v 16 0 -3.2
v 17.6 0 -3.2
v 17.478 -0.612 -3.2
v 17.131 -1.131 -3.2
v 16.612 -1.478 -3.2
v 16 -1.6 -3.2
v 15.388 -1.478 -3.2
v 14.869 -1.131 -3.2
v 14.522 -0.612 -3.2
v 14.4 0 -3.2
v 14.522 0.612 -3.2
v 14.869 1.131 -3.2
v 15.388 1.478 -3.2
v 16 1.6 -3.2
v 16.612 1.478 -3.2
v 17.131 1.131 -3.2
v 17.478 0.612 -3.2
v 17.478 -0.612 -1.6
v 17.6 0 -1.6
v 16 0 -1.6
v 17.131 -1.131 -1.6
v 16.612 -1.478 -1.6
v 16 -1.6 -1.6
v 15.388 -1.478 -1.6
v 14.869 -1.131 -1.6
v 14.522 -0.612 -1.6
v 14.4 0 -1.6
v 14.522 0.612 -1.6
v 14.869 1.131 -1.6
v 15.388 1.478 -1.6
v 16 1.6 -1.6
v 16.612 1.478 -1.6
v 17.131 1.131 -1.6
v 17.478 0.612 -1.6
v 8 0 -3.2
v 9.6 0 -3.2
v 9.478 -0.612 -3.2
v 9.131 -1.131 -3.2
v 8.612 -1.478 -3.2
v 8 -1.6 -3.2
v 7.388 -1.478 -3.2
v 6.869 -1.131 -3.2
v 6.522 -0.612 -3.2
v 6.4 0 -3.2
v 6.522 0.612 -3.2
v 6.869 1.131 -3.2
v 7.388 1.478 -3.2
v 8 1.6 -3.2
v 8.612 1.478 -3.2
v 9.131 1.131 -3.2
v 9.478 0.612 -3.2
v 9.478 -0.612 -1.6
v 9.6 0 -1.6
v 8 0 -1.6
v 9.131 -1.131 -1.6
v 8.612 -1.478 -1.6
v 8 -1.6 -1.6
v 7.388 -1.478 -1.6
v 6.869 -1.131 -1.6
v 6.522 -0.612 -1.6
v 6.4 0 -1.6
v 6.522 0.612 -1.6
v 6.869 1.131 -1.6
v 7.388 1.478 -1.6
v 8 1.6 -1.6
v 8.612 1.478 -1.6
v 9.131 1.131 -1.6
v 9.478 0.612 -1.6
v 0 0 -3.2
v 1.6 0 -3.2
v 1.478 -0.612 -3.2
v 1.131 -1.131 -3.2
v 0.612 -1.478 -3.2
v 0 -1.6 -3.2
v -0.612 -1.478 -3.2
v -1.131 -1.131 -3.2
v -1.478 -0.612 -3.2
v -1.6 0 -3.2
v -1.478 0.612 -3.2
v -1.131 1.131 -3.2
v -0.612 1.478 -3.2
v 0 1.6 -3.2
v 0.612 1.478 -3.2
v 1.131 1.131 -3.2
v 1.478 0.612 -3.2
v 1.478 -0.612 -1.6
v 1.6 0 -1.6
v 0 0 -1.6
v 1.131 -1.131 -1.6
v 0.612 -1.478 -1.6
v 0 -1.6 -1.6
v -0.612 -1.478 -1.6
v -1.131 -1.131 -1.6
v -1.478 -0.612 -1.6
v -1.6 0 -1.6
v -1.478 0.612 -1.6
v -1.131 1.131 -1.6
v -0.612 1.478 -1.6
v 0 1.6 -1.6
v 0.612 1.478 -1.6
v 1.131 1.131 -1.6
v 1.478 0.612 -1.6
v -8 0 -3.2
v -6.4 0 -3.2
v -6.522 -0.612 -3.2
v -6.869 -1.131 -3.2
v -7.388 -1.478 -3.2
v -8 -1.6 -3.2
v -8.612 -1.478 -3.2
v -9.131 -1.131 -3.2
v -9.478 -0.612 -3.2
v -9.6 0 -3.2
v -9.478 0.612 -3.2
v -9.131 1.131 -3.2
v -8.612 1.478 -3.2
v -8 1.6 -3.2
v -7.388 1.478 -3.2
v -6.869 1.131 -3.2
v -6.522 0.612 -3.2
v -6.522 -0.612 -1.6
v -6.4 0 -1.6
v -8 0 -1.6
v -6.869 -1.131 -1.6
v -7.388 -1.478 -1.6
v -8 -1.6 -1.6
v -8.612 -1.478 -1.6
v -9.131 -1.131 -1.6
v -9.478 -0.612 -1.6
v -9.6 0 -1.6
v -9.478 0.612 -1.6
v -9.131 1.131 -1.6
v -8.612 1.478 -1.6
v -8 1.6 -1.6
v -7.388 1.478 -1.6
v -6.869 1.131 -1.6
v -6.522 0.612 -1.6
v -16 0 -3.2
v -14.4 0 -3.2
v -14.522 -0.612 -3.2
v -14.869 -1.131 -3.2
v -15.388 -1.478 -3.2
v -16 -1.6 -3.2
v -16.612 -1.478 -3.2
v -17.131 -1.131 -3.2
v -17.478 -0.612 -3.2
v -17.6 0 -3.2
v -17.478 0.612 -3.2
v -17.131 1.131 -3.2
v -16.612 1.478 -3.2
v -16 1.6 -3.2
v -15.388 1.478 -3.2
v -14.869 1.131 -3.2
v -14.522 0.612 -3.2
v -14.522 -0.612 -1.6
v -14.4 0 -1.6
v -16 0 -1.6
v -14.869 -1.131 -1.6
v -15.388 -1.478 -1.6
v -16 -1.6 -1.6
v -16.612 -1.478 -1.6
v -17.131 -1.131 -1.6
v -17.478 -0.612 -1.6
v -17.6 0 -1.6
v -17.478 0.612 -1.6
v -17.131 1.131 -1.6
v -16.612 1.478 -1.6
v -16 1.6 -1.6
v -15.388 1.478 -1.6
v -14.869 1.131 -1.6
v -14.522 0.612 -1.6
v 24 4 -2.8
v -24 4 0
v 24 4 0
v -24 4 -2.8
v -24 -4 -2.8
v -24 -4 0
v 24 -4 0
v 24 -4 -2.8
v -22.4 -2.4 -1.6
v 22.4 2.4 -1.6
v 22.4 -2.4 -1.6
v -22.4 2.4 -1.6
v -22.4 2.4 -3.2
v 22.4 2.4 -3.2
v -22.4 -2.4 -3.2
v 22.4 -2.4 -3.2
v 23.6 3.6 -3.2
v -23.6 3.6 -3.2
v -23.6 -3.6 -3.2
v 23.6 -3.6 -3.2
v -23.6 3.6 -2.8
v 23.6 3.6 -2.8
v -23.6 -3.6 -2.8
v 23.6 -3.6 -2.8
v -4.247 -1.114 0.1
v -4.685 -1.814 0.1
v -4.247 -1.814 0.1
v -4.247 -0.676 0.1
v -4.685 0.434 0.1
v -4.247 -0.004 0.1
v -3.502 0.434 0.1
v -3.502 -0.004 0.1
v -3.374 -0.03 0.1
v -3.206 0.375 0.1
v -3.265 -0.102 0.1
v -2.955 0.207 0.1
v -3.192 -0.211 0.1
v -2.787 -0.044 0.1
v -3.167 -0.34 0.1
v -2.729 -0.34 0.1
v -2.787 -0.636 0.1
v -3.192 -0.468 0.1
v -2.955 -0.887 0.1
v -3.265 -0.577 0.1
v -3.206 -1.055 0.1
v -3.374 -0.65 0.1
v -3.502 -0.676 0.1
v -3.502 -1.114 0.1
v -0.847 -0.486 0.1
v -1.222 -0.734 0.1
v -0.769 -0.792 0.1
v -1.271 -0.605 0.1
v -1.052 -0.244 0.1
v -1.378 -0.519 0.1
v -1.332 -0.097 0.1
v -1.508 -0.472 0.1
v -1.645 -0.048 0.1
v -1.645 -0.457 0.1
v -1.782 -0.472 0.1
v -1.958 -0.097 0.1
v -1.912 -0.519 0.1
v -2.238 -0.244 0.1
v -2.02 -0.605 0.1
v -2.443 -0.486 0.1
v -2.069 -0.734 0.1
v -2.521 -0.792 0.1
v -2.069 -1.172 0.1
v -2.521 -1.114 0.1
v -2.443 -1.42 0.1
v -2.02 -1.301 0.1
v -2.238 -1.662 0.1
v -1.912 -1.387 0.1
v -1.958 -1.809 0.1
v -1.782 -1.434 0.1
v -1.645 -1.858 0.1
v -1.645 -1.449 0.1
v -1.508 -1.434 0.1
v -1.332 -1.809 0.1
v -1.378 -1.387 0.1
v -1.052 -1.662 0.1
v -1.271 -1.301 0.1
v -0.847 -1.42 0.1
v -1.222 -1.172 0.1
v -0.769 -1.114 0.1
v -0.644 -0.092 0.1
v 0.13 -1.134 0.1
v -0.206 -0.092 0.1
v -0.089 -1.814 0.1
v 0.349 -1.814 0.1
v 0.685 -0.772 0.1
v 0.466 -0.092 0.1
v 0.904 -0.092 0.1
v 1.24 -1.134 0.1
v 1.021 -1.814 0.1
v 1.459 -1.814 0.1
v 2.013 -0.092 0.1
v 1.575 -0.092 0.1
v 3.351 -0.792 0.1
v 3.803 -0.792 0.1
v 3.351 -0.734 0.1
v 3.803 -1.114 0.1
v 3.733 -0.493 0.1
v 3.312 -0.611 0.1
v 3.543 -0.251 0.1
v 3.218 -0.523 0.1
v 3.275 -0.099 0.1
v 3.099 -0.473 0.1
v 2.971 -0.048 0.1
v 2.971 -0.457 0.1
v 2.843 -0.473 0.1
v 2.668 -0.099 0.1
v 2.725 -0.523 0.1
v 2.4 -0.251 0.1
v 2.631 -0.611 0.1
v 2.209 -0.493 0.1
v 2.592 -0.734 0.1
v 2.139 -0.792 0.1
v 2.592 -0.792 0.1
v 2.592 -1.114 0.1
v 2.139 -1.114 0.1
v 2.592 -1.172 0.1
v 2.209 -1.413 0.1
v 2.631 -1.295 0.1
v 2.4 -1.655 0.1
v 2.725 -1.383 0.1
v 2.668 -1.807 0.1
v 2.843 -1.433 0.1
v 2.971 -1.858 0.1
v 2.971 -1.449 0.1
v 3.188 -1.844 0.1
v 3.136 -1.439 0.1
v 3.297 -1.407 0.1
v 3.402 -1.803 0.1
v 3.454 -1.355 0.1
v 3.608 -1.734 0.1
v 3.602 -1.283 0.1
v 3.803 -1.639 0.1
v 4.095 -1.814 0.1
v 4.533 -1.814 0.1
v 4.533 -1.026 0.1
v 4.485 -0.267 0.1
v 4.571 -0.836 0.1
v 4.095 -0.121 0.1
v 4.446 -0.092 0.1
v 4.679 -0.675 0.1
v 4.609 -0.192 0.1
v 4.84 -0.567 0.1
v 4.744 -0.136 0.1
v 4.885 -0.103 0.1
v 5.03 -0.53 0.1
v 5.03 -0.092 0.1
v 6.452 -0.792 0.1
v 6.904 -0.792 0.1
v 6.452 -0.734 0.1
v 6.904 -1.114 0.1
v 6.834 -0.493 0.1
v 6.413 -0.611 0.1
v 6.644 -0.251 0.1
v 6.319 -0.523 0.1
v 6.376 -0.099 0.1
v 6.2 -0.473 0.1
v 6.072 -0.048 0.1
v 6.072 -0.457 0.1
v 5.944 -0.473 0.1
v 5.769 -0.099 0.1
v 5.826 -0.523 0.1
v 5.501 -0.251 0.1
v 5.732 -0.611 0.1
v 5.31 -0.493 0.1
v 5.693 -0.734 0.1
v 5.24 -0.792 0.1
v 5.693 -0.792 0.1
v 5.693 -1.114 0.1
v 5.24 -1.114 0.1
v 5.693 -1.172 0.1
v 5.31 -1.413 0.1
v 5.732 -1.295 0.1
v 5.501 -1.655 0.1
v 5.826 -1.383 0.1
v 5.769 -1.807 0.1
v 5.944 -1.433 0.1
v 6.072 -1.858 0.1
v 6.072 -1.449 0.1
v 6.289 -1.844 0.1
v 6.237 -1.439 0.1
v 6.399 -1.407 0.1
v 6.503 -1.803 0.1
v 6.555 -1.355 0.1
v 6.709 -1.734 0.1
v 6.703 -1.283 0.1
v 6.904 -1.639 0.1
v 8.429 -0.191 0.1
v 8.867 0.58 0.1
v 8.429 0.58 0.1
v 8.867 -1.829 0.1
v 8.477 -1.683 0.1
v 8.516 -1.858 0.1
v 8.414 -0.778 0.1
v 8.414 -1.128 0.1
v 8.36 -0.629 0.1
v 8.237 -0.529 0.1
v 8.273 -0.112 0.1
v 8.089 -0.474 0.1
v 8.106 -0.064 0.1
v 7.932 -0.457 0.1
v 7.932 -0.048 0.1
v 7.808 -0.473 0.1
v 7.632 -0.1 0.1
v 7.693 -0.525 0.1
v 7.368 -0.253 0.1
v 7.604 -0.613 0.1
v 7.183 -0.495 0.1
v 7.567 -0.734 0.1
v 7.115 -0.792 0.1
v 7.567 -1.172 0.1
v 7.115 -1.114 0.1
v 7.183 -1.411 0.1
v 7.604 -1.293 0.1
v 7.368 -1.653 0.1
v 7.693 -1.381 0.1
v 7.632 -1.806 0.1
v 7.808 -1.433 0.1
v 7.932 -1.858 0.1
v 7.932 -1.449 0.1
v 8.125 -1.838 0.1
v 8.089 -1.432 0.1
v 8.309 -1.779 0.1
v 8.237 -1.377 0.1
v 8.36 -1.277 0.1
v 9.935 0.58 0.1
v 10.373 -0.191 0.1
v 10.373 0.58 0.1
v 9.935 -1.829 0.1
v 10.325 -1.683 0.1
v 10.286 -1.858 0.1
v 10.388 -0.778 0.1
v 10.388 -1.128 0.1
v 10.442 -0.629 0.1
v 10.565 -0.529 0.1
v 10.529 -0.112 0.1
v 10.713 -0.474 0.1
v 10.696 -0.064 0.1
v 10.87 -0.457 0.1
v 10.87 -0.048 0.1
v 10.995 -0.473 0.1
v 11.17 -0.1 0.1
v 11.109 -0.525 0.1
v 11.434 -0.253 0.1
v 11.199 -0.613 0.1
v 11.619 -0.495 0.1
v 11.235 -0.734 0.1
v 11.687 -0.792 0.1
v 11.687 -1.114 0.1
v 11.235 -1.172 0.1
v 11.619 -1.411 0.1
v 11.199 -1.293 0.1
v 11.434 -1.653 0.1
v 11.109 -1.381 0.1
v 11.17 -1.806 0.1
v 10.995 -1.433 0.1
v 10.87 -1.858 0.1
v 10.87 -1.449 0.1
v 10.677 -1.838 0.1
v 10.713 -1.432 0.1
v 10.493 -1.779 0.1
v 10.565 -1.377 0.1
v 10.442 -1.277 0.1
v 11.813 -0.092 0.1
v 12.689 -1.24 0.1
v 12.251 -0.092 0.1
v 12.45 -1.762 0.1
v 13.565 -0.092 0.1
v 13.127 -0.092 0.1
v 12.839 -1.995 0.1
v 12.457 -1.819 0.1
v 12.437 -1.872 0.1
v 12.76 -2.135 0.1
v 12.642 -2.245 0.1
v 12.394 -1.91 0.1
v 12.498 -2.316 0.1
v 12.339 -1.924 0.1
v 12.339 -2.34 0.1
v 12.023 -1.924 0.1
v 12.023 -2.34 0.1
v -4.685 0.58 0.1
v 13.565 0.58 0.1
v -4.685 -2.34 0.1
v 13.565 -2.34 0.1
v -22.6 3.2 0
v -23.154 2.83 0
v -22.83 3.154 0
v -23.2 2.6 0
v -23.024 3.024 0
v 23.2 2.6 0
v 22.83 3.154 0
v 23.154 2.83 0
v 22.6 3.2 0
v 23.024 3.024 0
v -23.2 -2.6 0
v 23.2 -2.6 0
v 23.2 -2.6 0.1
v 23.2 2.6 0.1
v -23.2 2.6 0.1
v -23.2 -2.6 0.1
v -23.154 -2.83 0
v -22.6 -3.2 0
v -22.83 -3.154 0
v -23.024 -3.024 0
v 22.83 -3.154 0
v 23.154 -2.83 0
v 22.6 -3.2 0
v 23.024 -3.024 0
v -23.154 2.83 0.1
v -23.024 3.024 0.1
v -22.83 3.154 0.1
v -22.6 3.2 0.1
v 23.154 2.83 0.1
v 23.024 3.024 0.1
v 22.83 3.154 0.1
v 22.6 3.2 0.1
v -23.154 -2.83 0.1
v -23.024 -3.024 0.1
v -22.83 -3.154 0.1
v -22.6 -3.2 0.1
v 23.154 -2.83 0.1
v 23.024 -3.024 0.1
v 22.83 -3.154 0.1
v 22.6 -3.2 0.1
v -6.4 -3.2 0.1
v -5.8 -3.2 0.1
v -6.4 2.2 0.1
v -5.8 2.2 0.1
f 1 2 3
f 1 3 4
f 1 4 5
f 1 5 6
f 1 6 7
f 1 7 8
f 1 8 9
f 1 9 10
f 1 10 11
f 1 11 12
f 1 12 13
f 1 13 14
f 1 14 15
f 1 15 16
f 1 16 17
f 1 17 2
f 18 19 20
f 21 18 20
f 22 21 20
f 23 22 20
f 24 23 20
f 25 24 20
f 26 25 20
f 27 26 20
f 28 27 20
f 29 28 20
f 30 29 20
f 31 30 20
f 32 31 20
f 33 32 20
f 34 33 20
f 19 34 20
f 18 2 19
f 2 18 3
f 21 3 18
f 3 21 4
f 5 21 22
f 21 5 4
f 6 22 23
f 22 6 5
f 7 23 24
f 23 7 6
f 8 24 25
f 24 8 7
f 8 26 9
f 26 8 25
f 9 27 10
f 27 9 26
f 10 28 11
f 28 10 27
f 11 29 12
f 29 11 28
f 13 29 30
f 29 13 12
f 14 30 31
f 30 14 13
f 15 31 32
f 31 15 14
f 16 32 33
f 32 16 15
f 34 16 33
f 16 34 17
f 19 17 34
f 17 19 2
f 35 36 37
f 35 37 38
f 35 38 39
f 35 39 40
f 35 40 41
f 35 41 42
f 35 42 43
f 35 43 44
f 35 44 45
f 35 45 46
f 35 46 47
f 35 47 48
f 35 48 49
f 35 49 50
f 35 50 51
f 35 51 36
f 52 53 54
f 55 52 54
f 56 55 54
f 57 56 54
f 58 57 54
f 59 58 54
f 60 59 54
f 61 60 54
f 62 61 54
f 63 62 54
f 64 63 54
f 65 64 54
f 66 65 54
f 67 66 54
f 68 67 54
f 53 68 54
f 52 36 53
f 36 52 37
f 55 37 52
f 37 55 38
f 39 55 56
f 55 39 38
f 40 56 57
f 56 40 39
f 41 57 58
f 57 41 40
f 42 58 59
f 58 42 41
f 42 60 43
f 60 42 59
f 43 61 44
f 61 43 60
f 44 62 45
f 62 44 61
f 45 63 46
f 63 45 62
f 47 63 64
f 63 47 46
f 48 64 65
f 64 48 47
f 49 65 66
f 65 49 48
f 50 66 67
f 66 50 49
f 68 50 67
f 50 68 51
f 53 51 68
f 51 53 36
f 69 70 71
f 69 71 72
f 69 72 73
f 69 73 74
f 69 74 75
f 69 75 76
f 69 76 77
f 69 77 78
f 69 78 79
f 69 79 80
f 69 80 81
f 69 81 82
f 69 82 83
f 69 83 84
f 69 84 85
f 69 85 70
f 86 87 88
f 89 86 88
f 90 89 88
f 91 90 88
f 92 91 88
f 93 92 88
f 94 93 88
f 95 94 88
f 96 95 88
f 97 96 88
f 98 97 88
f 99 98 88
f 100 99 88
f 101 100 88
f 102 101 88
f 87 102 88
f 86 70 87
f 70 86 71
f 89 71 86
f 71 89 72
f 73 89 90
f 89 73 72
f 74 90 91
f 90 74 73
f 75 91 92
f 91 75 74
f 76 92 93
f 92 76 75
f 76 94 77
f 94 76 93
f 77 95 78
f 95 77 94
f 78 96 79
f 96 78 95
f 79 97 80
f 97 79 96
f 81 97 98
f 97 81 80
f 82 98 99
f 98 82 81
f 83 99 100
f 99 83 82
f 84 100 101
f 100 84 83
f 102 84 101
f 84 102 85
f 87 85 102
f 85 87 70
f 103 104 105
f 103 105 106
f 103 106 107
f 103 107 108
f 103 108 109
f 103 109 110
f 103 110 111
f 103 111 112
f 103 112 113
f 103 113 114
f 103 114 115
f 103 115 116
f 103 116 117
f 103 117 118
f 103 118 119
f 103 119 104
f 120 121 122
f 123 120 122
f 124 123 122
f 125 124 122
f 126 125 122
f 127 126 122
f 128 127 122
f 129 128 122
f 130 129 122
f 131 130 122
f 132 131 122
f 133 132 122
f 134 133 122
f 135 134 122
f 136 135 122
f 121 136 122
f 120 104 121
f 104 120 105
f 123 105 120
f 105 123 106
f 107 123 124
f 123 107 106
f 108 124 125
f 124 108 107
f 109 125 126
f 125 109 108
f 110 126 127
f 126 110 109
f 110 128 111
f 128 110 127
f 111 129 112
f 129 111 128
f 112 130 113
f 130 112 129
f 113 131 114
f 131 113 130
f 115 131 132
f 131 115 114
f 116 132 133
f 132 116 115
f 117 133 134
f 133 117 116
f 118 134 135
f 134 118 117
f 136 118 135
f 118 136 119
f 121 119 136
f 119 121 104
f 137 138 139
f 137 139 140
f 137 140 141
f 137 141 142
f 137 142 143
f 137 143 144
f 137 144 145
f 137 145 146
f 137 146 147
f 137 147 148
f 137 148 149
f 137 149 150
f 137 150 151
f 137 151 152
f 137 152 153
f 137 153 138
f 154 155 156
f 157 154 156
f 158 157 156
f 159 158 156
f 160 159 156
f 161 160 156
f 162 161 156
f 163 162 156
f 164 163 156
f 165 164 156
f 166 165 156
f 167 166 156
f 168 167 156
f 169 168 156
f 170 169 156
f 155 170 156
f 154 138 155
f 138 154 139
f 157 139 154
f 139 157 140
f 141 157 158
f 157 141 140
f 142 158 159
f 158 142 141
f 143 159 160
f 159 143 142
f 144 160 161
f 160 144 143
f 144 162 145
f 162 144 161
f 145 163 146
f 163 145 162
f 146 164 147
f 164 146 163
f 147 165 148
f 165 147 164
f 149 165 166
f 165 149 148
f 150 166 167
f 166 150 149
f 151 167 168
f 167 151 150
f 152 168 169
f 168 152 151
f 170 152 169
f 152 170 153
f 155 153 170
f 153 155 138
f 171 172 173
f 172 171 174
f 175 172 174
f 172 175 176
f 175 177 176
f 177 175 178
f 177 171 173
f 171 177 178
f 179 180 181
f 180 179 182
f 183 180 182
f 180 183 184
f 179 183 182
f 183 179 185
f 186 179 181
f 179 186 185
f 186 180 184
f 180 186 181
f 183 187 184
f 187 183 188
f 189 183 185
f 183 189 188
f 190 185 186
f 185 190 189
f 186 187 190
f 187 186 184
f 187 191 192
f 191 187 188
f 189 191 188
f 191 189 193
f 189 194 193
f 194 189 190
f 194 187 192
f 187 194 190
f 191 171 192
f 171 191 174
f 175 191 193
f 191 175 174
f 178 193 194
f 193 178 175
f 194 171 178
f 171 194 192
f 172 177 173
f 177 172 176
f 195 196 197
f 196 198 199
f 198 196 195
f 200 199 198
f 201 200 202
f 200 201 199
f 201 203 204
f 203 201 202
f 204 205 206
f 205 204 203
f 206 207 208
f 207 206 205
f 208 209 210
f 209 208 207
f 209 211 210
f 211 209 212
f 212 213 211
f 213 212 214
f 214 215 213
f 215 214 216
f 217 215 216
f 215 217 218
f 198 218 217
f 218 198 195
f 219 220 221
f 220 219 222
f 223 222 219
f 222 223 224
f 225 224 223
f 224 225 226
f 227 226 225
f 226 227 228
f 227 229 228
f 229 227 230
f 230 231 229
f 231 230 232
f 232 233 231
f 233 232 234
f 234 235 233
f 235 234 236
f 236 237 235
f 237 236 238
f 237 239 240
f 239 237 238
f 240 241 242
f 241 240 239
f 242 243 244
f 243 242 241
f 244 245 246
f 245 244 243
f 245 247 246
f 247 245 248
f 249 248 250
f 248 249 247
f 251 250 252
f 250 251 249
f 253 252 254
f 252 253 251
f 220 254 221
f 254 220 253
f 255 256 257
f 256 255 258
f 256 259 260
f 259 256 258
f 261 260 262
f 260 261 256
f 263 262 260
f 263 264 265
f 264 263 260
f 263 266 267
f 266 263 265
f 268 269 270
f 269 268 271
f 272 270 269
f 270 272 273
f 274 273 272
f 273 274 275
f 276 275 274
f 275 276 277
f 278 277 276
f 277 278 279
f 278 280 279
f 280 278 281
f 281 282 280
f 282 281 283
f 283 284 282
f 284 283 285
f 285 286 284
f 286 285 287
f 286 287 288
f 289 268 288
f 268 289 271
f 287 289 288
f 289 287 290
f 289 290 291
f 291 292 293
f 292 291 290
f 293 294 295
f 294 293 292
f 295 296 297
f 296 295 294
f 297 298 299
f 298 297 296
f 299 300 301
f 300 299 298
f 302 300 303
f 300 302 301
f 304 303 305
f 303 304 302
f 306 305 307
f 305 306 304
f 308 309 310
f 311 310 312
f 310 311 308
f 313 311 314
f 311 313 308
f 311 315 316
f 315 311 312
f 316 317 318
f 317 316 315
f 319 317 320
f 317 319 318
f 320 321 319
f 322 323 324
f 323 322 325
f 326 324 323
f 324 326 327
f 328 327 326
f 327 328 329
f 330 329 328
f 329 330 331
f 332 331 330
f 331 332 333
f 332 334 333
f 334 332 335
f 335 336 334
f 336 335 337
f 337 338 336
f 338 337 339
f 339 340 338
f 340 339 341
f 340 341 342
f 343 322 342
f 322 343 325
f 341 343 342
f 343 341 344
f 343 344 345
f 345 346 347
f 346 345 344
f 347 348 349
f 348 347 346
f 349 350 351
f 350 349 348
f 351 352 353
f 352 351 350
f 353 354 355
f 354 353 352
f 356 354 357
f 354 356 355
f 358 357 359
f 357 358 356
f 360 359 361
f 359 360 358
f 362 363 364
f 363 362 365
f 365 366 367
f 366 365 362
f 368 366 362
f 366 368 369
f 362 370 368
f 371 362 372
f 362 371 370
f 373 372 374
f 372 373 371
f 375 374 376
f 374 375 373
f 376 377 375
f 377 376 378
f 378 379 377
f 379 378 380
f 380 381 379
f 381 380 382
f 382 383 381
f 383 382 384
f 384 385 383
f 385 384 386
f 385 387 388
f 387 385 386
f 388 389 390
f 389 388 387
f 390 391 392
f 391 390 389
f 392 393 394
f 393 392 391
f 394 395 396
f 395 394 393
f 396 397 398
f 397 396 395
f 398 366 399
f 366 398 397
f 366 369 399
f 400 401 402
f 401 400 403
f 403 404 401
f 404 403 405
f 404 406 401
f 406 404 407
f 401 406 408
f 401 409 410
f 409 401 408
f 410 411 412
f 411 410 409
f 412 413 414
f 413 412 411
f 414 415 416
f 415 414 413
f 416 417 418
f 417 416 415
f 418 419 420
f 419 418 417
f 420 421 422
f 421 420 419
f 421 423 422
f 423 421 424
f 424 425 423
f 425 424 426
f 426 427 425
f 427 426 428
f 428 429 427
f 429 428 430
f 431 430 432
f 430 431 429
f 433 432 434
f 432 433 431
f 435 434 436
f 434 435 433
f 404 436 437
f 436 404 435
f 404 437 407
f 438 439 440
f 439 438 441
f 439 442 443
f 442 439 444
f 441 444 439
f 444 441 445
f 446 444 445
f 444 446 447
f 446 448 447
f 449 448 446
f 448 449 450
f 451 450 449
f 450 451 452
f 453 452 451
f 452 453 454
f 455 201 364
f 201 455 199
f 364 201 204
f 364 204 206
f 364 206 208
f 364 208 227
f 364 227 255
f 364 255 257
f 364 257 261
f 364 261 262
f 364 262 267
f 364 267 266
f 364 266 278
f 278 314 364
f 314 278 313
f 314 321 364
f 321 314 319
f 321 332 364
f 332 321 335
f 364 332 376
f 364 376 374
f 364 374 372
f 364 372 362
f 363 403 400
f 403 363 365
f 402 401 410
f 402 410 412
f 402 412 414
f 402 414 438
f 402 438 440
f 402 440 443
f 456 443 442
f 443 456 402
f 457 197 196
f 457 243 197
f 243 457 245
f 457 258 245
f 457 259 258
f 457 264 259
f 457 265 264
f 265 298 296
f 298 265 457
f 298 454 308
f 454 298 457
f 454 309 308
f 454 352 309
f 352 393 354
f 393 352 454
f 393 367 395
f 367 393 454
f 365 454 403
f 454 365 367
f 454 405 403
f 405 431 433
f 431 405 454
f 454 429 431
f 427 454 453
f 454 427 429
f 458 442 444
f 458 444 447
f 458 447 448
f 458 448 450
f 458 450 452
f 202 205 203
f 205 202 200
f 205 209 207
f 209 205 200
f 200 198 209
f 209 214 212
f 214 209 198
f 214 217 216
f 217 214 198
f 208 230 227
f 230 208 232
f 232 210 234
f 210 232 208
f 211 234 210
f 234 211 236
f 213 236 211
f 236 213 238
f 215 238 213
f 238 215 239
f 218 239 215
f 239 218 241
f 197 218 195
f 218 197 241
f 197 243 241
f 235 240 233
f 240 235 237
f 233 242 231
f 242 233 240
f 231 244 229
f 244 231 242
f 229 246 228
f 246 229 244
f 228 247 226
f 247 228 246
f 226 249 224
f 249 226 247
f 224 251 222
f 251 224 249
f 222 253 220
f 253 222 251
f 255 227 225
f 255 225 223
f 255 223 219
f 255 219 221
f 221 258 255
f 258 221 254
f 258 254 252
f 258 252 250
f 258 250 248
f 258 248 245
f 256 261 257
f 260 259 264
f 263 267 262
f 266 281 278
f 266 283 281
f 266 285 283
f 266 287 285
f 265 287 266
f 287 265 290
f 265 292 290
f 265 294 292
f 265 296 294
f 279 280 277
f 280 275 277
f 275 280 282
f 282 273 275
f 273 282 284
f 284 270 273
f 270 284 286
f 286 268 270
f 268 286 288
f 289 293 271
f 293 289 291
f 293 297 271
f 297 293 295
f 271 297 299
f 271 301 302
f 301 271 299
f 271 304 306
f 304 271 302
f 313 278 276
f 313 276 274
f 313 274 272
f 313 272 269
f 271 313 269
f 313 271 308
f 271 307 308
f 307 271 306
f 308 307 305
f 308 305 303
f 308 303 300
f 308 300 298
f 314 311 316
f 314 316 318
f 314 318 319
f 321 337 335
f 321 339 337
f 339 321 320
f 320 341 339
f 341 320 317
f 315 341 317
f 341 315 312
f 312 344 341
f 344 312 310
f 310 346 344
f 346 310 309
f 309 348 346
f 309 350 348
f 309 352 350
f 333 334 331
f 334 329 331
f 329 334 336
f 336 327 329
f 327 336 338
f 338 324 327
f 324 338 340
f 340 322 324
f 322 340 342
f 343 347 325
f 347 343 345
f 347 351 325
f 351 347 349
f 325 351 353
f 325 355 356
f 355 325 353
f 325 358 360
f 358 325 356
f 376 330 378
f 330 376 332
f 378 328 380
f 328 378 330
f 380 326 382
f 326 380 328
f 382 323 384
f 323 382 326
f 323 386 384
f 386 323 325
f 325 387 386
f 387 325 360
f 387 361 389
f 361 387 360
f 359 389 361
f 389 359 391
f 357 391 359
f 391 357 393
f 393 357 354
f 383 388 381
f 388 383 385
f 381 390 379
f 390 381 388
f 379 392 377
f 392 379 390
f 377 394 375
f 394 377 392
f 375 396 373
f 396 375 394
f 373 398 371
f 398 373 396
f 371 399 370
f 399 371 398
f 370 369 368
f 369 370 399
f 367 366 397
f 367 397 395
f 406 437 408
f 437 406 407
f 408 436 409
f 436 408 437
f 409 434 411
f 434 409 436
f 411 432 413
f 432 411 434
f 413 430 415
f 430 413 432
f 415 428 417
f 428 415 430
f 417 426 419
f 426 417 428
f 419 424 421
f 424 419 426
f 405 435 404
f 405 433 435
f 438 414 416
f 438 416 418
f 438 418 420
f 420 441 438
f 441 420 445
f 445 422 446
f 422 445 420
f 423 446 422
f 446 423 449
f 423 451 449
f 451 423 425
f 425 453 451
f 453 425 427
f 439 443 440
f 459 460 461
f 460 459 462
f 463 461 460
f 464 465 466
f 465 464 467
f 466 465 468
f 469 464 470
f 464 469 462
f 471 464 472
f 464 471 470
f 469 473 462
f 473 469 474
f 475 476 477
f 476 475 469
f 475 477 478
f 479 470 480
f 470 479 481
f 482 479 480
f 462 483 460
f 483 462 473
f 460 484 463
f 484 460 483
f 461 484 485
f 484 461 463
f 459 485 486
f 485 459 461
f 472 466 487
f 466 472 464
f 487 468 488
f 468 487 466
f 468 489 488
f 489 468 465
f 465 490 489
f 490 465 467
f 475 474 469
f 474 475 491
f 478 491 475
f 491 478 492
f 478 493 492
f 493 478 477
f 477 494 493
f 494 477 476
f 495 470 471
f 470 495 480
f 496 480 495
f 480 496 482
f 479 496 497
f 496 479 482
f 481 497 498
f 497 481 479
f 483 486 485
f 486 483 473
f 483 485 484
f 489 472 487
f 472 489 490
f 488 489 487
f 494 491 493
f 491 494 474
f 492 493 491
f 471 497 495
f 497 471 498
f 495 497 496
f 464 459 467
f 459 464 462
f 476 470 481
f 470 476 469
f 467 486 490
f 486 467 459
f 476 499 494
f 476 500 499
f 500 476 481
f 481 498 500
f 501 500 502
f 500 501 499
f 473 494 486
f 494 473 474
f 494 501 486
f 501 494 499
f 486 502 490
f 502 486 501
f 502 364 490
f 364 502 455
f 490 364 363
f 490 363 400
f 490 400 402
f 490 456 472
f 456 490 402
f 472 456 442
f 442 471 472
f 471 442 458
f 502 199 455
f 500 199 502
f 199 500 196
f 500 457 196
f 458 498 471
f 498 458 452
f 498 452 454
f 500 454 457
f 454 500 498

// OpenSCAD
use <../lib.scad>
use <6177969o.scad>
use <6636.scad>
function ldraw_lib__6636dy4() = [
// 0 Tile  1 x  6 with Black "Powered by" on White Background Sticker
// 0 Name: 6636dy4.dat
// 0 Author: Alfred Schmitz [AlfredS]
// 0 !LDRAW_ORG Shortcut UPDATE 2026-09
// 0 !LICENSE Licensed under CC BY 4.0 : see CAreadme.txt
// 
// 0 BFC CERTIFY CCW
  [0,"BFC","CERTIFY"],
  [0,"BFC","CCW"],
// 
// 0 !CATEGORY Sticker Shortcut
// 0 !KEYWORDS Ford, GT, Set 75881, Speed Champions
// 
// 0 !HISTORY 2026-09-30 [OrionP] Official Update 2026-09
// 
// 1 16 0 0 0 1 0 0 0 1 0 0 0 1 6636.dat
  [1,16,0,0,0,1,0,0,0,1,0,0,0,1, ldraw_lib__6636()],
// 1 16 0 0 0 1 0 0 0 1 0 0 0 1 6177969o.dat
  [1,16,0,0,0,1,0,0,0,1,0,0,0,1, ldraw_lib__6177969o()],
];
module ldraw_lib__6636dy4(step=0, col=false, unit=2/5, alt=false, line=0.2, solid=!$preview)
    makepoly(ldraw_lib__6636dy4(), step=step, col=col, unit=unit, alt=alt, line=line, solid=solid);
ldraw_lib__6636dy4(line=0.2);
